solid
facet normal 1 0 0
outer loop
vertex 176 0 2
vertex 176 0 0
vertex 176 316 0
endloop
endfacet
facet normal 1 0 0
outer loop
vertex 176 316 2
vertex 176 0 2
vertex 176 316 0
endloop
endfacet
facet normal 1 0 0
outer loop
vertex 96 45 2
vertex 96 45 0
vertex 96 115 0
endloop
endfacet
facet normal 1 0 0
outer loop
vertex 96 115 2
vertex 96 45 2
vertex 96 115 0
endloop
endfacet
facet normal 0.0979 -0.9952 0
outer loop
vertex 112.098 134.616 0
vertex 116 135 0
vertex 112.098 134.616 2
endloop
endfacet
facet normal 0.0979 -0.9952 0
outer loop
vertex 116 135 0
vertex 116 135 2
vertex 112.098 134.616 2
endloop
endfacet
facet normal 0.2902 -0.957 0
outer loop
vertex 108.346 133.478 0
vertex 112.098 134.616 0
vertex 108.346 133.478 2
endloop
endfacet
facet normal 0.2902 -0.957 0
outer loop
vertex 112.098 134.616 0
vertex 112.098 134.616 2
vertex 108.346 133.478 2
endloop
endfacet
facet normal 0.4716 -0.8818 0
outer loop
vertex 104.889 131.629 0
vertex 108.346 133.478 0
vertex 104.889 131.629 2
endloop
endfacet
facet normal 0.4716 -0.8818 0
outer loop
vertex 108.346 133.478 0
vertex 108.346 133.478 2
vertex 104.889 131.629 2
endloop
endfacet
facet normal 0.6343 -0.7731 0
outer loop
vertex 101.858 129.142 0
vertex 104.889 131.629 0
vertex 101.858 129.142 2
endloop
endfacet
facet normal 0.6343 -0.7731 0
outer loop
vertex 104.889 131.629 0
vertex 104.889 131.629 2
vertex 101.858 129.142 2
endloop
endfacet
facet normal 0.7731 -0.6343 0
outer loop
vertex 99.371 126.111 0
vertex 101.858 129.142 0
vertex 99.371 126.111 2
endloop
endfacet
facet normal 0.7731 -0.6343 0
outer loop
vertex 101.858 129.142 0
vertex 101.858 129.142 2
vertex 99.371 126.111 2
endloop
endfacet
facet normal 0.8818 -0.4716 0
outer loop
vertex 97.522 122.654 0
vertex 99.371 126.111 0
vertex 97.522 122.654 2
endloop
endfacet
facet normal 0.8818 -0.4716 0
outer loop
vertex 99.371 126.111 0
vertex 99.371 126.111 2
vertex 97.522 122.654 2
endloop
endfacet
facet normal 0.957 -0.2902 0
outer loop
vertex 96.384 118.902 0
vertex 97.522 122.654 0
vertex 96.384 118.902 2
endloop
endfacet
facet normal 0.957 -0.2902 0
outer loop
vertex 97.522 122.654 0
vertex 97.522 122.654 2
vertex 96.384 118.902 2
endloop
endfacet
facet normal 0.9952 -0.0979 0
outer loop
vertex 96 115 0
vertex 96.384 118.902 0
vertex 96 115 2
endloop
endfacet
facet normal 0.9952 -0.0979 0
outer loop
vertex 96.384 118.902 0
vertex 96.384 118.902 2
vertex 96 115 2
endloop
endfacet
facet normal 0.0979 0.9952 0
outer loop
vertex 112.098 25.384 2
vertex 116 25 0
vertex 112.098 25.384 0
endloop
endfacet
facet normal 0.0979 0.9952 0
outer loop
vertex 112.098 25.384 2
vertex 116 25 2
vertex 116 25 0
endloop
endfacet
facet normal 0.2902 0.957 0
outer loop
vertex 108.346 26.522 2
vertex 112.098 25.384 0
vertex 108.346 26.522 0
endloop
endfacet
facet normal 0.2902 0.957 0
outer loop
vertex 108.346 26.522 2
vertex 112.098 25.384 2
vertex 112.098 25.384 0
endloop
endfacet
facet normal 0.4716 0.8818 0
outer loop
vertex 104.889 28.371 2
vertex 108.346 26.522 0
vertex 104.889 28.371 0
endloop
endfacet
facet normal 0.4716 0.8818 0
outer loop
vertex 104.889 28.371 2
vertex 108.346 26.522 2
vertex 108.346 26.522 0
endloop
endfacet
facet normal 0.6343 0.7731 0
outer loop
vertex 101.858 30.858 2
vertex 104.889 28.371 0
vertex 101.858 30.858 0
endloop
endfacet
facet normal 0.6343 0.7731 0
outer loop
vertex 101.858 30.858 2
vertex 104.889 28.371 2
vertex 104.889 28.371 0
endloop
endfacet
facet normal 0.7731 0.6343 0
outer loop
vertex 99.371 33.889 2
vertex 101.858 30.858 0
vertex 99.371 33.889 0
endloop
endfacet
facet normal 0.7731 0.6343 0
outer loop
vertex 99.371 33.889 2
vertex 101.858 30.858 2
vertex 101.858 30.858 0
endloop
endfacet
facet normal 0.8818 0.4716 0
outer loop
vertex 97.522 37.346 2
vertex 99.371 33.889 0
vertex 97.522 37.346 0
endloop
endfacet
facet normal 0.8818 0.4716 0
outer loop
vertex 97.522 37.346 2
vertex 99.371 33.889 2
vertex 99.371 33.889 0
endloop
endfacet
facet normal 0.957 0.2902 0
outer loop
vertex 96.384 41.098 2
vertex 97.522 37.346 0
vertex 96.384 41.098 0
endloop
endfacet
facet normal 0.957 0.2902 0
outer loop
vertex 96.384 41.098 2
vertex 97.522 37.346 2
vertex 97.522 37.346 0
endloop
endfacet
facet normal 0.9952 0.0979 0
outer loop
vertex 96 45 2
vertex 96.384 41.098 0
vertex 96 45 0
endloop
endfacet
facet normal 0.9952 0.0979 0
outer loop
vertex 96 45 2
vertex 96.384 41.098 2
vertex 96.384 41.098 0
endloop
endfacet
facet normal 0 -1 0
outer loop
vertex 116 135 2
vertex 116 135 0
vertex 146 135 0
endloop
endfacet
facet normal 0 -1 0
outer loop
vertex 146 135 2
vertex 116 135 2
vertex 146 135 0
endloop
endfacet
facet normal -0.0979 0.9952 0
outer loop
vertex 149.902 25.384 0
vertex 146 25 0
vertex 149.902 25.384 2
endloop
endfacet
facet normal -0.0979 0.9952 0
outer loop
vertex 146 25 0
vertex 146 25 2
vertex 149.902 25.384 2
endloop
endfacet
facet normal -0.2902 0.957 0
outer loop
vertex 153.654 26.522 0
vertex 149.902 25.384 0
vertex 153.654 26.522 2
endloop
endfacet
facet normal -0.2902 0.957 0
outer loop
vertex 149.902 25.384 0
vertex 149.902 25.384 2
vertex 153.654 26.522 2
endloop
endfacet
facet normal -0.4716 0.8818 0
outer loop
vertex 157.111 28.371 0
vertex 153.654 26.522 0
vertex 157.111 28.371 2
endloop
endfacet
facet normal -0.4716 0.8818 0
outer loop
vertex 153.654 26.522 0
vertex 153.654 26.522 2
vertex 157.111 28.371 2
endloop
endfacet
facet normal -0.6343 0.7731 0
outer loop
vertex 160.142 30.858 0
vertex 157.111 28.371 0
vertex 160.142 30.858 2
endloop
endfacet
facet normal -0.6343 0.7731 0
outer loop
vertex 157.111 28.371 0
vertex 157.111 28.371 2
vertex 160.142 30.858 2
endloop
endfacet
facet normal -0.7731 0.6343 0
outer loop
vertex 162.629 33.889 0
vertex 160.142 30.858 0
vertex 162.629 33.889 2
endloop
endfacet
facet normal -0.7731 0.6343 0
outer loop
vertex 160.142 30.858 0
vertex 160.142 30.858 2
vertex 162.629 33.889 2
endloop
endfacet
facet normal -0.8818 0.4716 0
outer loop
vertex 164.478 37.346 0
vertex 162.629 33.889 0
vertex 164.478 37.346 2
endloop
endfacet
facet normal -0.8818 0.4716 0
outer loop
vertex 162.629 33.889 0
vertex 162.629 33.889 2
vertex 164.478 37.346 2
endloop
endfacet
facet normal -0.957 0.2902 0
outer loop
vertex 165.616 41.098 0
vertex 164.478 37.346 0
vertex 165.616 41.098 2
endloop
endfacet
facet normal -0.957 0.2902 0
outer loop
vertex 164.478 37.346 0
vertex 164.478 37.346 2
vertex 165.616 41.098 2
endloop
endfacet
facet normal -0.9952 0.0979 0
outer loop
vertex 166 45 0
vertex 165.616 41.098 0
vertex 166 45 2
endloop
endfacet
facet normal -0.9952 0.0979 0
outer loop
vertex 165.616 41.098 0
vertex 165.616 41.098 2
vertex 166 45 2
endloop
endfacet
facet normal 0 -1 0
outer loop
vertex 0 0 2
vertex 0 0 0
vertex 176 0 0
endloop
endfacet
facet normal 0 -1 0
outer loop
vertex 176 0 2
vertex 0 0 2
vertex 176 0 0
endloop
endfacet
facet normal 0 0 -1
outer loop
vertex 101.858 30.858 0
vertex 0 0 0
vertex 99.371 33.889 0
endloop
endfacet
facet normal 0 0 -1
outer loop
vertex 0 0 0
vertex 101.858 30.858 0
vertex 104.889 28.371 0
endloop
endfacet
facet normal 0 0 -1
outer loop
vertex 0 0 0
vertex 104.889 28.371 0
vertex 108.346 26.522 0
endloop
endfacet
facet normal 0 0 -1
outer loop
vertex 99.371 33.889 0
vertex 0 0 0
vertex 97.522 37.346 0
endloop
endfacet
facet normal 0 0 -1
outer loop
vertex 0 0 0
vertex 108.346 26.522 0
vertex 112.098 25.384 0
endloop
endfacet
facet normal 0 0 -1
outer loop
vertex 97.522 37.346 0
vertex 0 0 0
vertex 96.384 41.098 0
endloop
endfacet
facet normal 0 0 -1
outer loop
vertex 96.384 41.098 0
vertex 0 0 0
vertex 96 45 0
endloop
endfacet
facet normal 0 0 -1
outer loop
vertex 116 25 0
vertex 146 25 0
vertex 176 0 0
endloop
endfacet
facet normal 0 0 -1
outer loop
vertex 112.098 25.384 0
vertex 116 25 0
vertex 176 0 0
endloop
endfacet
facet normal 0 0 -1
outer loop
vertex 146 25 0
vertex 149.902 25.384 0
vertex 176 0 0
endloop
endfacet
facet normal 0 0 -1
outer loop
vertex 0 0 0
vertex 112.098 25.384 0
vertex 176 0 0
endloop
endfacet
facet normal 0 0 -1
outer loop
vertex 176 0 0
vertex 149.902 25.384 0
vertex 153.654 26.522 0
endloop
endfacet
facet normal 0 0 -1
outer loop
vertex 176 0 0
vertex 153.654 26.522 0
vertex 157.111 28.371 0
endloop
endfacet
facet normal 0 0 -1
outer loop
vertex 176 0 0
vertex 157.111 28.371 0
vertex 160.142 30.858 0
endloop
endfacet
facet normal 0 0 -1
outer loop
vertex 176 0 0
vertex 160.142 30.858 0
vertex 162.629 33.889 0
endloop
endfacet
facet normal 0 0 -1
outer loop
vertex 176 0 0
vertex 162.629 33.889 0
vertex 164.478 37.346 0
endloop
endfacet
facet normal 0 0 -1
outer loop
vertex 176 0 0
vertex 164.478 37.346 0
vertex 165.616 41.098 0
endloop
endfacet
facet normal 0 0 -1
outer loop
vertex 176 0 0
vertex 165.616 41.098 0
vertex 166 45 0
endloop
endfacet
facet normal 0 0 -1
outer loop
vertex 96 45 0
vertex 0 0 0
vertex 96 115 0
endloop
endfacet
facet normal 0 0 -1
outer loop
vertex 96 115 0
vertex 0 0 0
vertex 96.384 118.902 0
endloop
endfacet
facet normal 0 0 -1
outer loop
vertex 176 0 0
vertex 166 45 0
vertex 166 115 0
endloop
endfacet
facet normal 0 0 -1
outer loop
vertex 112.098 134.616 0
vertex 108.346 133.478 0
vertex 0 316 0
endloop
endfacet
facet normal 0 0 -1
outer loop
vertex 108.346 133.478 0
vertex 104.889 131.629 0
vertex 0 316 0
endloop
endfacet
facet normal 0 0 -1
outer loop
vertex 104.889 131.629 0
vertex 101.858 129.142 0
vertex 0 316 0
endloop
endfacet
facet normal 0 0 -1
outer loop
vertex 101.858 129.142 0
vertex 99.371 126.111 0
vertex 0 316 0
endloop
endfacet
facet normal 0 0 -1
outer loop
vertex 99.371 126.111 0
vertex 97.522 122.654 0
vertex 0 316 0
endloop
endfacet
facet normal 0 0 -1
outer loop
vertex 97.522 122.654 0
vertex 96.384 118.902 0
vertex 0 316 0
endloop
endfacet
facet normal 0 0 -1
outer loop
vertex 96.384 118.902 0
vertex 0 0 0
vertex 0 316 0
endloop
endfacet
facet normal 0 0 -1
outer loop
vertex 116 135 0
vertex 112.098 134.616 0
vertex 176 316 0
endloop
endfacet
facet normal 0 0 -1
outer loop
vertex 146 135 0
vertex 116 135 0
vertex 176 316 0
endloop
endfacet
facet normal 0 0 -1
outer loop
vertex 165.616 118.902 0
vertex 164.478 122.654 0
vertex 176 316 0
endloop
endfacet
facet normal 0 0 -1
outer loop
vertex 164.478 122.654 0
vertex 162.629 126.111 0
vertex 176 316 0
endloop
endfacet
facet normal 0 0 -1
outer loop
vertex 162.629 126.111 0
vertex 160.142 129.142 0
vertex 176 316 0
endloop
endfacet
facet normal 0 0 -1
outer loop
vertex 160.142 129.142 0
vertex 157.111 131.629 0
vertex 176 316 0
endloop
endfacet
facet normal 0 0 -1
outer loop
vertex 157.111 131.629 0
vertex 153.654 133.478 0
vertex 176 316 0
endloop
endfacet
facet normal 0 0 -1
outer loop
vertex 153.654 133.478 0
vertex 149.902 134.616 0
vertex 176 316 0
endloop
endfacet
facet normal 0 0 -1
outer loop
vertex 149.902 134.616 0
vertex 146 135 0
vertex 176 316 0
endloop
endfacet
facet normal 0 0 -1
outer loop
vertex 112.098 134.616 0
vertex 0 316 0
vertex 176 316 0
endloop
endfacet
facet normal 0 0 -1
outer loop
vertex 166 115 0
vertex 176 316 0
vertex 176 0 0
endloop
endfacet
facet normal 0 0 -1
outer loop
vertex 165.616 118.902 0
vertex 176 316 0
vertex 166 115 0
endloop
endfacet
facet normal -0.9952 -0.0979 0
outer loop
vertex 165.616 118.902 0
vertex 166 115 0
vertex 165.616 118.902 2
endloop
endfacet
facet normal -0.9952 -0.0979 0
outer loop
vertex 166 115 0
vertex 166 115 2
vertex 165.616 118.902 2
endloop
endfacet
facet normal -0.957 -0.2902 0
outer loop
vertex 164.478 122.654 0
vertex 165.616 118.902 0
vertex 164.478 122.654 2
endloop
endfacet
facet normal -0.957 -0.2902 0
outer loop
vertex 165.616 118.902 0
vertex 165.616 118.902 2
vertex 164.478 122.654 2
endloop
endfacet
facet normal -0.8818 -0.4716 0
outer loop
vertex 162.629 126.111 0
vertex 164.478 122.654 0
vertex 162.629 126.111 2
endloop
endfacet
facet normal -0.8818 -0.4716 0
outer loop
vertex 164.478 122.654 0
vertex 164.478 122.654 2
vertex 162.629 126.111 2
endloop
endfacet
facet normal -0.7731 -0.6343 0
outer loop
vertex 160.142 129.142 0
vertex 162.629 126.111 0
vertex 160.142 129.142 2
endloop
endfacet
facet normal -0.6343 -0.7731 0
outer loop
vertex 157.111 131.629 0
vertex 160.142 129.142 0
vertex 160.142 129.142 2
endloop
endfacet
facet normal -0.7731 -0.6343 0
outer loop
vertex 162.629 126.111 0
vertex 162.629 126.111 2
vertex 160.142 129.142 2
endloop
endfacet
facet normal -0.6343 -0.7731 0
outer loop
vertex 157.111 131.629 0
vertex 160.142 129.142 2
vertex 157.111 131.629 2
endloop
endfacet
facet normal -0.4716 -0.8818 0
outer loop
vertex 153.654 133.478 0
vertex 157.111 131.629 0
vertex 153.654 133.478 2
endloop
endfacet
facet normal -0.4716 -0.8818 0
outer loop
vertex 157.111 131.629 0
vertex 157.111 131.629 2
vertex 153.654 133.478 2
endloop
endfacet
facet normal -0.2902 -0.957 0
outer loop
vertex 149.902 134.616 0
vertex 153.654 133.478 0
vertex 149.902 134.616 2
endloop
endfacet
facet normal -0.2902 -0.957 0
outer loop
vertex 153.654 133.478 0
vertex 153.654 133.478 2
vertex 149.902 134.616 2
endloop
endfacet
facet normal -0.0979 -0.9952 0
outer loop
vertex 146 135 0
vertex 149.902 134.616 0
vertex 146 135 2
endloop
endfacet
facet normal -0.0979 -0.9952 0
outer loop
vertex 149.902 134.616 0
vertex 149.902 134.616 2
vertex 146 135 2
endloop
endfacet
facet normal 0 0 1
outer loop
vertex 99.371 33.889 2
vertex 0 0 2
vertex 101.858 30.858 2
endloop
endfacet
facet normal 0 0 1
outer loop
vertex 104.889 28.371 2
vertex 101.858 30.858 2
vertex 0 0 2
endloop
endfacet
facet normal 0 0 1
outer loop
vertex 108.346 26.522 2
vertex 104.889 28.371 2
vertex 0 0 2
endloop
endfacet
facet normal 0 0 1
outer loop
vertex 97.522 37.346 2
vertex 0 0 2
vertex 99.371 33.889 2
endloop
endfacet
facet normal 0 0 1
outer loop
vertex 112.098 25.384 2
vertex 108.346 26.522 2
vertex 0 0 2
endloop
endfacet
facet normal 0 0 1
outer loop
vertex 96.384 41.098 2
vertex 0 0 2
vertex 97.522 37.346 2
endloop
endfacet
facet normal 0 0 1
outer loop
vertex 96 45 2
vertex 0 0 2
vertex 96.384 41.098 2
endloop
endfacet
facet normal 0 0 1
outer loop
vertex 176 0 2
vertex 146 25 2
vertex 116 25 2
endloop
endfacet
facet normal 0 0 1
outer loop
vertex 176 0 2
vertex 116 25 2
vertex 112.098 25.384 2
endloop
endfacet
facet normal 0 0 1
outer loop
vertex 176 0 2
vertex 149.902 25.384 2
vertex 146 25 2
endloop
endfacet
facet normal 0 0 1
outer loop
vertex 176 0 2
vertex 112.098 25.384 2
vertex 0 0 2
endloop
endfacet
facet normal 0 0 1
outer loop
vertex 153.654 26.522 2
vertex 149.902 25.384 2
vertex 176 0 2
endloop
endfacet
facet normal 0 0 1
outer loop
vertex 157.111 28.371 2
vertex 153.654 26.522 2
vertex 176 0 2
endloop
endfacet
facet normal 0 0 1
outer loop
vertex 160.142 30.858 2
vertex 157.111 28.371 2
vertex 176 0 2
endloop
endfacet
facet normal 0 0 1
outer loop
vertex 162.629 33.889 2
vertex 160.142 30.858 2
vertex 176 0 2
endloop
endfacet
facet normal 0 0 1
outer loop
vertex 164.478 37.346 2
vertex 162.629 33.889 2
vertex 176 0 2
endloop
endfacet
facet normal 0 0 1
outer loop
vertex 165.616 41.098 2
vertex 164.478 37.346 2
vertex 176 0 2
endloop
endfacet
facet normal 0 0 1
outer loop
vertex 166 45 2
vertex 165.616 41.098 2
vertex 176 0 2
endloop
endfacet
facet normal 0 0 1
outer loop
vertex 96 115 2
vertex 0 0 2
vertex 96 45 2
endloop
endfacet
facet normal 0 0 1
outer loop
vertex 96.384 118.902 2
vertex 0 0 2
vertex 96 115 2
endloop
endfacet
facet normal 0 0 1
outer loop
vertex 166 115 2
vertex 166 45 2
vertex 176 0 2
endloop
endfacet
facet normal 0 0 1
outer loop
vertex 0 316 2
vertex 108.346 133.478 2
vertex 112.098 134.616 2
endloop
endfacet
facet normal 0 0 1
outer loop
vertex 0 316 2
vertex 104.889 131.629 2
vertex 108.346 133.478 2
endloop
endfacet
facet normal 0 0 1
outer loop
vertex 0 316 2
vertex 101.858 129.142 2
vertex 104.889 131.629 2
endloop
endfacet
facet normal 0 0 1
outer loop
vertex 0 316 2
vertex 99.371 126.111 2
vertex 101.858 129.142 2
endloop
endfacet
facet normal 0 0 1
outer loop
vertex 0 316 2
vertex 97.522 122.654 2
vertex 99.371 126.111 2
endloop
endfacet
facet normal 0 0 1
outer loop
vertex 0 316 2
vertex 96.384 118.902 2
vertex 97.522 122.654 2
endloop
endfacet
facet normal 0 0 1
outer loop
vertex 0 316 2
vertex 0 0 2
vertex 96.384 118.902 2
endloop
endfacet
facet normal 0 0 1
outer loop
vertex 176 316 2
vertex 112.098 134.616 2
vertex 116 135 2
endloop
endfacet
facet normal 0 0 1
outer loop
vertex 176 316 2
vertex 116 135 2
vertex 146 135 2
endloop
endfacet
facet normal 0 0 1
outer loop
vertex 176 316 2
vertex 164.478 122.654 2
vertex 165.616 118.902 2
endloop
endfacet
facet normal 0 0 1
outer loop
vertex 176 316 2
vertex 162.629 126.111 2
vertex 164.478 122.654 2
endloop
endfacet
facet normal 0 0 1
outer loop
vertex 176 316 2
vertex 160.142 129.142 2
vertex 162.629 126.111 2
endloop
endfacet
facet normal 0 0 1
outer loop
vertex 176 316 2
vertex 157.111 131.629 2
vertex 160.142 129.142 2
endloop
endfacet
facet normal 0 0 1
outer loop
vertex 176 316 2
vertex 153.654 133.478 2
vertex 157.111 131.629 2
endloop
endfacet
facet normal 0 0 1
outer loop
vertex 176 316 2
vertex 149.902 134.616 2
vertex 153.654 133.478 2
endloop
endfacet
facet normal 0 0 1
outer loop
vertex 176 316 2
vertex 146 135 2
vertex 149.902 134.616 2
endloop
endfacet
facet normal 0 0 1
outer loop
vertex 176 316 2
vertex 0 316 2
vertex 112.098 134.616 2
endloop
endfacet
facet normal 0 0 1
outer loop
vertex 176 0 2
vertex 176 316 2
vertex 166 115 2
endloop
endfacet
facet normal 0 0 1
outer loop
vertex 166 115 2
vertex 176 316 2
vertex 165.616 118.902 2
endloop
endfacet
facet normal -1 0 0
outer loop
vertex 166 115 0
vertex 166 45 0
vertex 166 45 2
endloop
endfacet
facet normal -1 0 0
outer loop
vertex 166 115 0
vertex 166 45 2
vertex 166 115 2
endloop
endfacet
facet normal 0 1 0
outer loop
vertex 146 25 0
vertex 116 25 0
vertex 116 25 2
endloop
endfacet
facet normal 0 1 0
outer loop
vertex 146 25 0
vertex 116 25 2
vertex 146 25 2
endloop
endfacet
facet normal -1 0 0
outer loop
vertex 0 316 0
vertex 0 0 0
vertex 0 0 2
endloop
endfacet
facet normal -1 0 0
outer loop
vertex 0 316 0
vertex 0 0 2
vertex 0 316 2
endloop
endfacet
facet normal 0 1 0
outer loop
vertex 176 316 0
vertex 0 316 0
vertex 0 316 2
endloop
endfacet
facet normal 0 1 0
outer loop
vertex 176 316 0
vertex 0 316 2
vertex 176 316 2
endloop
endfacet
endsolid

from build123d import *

# Parameters (mm, degrees)
ESQUISSE1_W        = 176
ESQUISSE1_H        = 316
ESQUISSE1_W_2      = 70
ESQUISSE1_H_2      = 110
BOSS_EXTRU_1_DEPTH = 2
CONG_1_R           = 20


with BuildPart() as part:
    # Esquisse1 → Boss.-Extru.1 (new body)
    with BuildSketch(Plane.XY):
        with Locations((88, 158)):
            Rectangle(ESQUISSE1_W, ESQUISSE1_H)
        with Locations((131, 80)):
            Rectangle(ESQUISSE1_W_2, ESQUISSE1_H_2, mode=Mode.SUBTRACT)
    extrude(amount=BOSS_EXTRU_1_DEPTH)

    # Congé1
    cong_1_edges = [part.edges().sort_by_distance(p)[0] for p in [
        (166, 25, 1),
        (166, 135, 1),
        (96, 135, 1),
        (96, 25, 1),
    ]]
    fillet(cong_1_edges, radius=CONG_1_R)


solid = part.part
